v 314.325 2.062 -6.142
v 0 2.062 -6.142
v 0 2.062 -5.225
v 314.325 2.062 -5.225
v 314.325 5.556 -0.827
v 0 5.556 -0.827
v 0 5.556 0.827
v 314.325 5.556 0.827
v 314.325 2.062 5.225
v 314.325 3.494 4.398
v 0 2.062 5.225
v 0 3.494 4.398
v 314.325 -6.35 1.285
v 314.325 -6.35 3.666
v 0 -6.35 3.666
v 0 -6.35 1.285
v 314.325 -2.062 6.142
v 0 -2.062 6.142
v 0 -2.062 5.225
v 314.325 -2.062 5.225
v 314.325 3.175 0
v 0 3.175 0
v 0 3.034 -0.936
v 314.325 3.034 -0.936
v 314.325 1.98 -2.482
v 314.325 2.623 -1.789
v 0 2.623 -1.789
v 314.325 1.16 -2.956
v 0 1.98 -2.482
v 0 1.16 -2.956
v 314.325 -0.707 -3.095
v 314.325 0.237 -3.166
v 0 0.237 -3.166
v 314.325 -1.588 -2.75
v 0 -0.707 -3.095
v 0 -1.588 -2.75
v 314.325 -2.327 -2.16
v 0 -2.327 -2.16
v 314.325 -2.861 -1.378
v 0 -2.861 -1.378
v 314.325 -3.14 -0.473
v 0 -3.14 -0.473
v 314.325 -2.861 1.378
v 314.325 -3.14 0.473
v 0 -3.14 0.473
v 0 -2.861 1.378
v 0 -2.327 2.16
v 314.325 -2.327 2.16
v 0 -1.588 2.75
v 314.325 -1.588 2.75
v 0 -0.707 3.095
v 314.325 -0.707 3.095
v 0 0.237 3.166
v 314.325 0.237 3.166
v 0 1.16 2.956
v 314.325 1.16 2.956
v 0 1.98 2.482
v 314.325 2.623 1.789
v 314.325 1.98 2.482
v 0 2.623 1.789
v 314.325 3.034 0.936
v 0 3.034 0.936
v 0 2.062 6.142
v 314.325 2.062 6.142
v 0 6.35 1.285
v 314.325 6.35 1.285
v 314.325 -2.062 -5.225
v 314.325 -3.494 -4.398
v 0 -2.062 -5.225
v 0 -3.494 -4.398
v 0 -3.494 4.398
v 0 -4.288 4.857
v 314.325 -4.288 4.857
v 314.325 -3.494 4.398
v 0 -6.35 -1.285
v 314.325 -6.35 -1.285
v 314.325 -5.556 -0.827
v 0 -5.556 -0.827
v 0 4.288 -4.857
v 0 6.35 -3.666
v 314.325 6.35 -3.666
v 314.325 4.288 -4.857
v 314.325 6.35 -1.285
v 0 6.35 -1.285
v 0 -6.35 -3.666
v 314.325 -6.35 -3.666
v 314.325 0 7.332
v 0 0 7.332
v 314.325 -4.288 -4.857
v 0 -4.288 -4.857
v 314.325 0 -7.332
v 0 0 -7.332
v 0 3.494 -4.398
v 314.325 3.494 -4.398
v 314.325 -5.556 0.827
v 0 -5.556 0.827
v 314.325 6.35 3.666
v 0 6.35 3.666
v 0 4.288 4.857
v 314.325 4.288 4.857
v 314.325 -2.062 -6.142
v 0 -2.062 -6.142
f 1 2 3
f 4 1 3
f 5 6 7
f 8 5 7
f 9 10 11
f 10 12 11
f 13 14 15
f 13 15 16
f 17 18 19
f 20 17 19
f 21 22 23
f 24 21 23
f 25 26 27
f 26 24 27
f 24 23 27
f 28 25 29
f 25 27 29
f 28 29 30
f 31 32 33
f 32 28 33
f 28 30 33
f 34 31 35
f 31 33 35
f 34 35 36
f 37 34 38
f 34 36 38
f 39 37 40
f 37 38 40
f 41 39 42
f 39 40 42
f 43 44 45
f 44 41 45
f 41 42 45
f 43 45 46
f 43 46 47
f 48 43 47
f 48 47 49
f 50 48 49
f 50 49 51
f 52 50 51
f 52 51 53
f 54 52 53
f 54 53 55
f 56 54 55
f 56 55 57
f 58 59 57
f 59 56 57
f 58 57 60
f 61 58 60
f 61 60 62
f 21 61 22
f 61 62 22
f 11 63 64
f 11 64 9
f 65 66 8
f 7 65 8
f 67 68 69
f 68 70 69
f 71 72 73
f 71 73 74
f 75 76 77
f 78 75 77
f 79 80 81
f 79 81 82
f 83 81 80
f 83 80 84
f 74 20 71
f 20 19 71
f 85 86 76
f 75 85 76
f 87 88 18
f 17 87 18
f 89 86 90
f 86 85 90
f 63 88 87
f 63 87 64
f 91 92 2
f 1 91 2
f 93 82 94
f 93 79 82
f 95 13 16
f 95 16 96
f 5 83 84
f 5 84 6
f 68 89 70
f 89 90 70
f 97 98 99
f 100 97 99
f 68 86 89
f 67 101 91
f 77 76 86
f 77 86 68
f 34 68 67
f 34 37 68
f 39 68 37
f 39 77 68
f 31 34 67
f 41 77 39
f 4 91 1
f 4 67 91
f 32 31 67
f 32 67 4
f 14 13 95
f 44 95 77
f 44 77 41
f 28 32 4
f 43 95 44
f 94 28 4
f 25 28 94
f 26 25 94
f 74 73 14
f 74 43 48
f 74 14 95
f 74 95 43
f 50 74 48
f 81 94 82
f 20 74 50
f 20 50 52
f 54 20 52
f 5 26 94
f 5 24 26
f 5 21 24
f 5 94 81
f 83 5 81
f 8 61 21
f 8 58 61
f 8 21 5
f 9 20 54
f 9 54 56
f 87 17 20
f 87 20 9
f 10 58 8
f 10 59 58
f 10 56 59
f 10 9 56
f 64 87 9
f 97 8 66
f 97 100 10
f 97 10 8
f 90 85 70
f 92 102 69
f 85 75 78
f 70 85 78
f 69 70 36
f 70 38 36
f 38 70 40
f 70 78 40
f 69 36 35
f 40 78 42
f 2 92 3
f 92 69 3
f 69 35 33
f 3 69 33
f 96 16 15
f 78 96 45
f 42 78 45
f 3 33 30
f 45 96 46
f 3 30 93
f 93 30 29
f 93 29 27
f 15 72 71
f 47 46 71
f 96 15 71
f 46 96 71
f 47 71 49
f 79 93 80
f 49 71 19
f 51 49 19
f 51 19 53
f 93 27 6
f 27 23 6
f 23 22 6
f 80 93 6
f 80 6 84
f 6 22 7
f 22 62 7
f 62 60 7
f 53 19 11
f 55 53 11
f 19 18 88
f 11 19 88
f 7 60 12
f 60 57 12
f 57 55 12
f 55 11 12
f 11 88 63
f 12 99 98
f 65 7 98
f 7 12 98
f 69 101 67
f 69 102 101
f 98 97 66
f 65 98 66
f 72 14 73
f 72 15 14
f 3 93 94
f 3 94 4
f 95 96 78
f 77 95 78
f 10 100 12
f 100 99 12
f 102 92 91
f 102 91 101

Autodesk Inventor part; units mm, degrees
ref_plane "YZ Plane" through (0, 0, 0) normal (1, 0, 0) x (0, 1, 0)
ref_plane "XZ Plane" through (0, 0, 0) normal (0, 1, 0) x (-1, 0, 0)
ref_plane "XY Plane" through (0, 0, 0) normal (0, 0, 1) x (1, 0, 0)
sketch "Sketch1" plane through (0, 0, 0) normal (1, 0, 0) x (0, 1, 0)
  line L0 (6.35, 3.6662) -> (6.35, -3.6662) construction
  line L1 (6.35, -3.6662) -> (0, -7.3323) construction
  line L2 (0, -7.3323) -> (-6.35, -3.6662) construction
  line L3 (-6.35, -3.6662) -> (-6.35, 3.6662) construction
  line L4 (-6.35, 3.6662) -> (0, 7.3323) construction
  line L5 (0, 7.3323) -> (6.35, 3.6662) construction
  line L6 (5.5563, -3.2079) -> (5.5563, 3.2079) construction
  line L7 (5.5563, 3.2079) -> (0, 6.4158) construction
  line L8 (0, 6.4158) -> (-5.5563, 3.2079) construction
  line L9 (-5.5563, 3.2079) -> (-5.5563, -3.2079) construction
  line L10 (-5.5563, -3.2079) -> (0, -6.4158) construction
  line L11 (0, -6.4158) -> (5.5563, -3.2079) construction
  line L12 (6.35, 3.6662) -> (6.35, 1.2849)
  line L13 (6.35, 3.6662) -> (4.2878, 4.8568)
  line L14 (6.35, -3.6662) -> (6.35, -1.2849)
  line L15 (6.35, -3.6662) -> (4.2878, -4.8568)
  line L16 (0, -7.3323) -> (2.0622, -6.1417)
  line L17 (0, -7.3323) -> (-2.0622, -6.1417)
  line L18 (-6.35, -3.6662) -> (-4.2878, -4.8568)
  line L19 (-6.35, -3.6662) -> (-6.35, -1.2849)
  line L20 (-6.35, 3.6662) -> (-6.35, 1.2849)
  line L21 (-6.35, 3.6662) -> (-4.2878, 4.8568)
  line L22 (0, 7.3323) -> (2.0622, 6.1417)
  line L23 (0, 7.3323) -> (-2.0622, 6.1417)
  line L24 (6.35, 1.2849) -> (5.5563, 0.8267)
  line L25 (6.35, 1.2849) -> (7.2665, 1.2849) construction
  line L26 (6.35, -1.2849) -> (5.5563, -0.8267)
  line L27 (6.35, -1.2849) -> (7.2665, -1.2849) construction
  line L28 (5.5563, -0.8267) -> (5.5563, 0.8267)
  line L29 (4.2878, -4.8568) -> (3.494, -4.3985)
  line L30 (4.2878, -4.8568) -> (5.2043, -4.8568) construction
  line L31 (2.0622, -6.1417) -> (2.0622, -5.2252)
  line L32 (2.0622, -6.1417) -> (2.9788, -6.1417) construction
  line L33 (-2.0622, -6.1417) -> (-2.0622, -5.2252)
  line L34 (-2.0622, -6.1417) -> (-1.1457, -6.1417) construction
  line L35 (3.494, -4.3985) -> (2.0622, -5.2252)
  line L36 (-4.2878, -4.8568) -> (-3.494, -4.3985)
  line L37 (-4.2878, -4.8568) -> (-3.3712, -4.8568) construction
  line L38 (-3.494, -4.3985) -> (-2.0622, -5.2252)
  line L39 (-6.35, -1.2849) -> (-5.5563, -0.8267)
  line L40 (-6.35, -1.2849) -> (-5.4335, -1.2849) construction
  line L41 (-6.35, 1.2849) -> (-5.5563, 0.8267)
  line L42 (-6.35, 1.2849) -> (-5.4335, 1.2849) construction
  line L43 (-5.5563, 0.8267) -> (-5.5563, -0.8267)
  line L44 (-4.2878, 4.8568) -> (-3.494, 4.3985)
  line L45 (-4.2878, 4.8568) -> (-3.3712, 4.8568) construction
  line L46 (-2.0622, 6.1417) -> (-2.0622, 5.2252)
  line L47 (-2.0622, 6.1417) -> (-1.1457, 6.1417) construction
  line L48 (-2.0622, 5.2252) -> (-3.494, 4.3985)
  line L49 (2.0622, 6.1417) -> (2.0622, 5.2252)
  line L50 (2.0622, 6.1417) -> (2.9788, 6.1417) construction
  line L51 (4.2878, 4.8568) -> (3.494, 4.3985)
  line L52 (4.2878, 4.8568) -> (5.2043, 4.8568) construction
  line L53 (3.494, 4.3985) -> (2.0622, 5.2252)
  circle A0 centre (0, 0) radius 3.175
  dimension "d0" = 12.7
  dimension "d1" = 12.7
  dimension "d2" = 12.7
  dimension "d3" = 120
  dimension "d4" = 120
  dimension "d5" = 6.35
  dimension "d6" = 6.35
  dimension "d7" = 6.35
  dimension "d11" = 0.7937
  dimension "d12" = 2.3813
  dimension "d13" = 2.3813
  dimension "d14" = 2.3813
  dimension "d15" = 2.3813
  dimension "d16" = 2.3813
  dimension "d17" = 2.3813
  dimension "d18" = 2.3813
  dimension "d19" = 2.3813
  dimension "d20" = 2.3813
  dimension "d21" = 2.3813
  dimension "d22" = 2.3813
  dimension "d23" = 2.3813
  dimension "d24" = 150
  dimension "d25" = 150
  dimension "d26" = 150
  dimension "d27" = 90
  dimension "d28" = 90
  dimension "d29" = 30
  dimension "d30" = 30
  dimension "d31" = 30
  dimension "d32" = 30
  dimension "d33" = 90
  dimension "d34" = 90
  dimension "d35" = 150
  dimension "d36" = 6.35
extrude "Extrusion1" add sketch "Sketch1" along normal blind 314.325
properties part number "churro gearbox support"
